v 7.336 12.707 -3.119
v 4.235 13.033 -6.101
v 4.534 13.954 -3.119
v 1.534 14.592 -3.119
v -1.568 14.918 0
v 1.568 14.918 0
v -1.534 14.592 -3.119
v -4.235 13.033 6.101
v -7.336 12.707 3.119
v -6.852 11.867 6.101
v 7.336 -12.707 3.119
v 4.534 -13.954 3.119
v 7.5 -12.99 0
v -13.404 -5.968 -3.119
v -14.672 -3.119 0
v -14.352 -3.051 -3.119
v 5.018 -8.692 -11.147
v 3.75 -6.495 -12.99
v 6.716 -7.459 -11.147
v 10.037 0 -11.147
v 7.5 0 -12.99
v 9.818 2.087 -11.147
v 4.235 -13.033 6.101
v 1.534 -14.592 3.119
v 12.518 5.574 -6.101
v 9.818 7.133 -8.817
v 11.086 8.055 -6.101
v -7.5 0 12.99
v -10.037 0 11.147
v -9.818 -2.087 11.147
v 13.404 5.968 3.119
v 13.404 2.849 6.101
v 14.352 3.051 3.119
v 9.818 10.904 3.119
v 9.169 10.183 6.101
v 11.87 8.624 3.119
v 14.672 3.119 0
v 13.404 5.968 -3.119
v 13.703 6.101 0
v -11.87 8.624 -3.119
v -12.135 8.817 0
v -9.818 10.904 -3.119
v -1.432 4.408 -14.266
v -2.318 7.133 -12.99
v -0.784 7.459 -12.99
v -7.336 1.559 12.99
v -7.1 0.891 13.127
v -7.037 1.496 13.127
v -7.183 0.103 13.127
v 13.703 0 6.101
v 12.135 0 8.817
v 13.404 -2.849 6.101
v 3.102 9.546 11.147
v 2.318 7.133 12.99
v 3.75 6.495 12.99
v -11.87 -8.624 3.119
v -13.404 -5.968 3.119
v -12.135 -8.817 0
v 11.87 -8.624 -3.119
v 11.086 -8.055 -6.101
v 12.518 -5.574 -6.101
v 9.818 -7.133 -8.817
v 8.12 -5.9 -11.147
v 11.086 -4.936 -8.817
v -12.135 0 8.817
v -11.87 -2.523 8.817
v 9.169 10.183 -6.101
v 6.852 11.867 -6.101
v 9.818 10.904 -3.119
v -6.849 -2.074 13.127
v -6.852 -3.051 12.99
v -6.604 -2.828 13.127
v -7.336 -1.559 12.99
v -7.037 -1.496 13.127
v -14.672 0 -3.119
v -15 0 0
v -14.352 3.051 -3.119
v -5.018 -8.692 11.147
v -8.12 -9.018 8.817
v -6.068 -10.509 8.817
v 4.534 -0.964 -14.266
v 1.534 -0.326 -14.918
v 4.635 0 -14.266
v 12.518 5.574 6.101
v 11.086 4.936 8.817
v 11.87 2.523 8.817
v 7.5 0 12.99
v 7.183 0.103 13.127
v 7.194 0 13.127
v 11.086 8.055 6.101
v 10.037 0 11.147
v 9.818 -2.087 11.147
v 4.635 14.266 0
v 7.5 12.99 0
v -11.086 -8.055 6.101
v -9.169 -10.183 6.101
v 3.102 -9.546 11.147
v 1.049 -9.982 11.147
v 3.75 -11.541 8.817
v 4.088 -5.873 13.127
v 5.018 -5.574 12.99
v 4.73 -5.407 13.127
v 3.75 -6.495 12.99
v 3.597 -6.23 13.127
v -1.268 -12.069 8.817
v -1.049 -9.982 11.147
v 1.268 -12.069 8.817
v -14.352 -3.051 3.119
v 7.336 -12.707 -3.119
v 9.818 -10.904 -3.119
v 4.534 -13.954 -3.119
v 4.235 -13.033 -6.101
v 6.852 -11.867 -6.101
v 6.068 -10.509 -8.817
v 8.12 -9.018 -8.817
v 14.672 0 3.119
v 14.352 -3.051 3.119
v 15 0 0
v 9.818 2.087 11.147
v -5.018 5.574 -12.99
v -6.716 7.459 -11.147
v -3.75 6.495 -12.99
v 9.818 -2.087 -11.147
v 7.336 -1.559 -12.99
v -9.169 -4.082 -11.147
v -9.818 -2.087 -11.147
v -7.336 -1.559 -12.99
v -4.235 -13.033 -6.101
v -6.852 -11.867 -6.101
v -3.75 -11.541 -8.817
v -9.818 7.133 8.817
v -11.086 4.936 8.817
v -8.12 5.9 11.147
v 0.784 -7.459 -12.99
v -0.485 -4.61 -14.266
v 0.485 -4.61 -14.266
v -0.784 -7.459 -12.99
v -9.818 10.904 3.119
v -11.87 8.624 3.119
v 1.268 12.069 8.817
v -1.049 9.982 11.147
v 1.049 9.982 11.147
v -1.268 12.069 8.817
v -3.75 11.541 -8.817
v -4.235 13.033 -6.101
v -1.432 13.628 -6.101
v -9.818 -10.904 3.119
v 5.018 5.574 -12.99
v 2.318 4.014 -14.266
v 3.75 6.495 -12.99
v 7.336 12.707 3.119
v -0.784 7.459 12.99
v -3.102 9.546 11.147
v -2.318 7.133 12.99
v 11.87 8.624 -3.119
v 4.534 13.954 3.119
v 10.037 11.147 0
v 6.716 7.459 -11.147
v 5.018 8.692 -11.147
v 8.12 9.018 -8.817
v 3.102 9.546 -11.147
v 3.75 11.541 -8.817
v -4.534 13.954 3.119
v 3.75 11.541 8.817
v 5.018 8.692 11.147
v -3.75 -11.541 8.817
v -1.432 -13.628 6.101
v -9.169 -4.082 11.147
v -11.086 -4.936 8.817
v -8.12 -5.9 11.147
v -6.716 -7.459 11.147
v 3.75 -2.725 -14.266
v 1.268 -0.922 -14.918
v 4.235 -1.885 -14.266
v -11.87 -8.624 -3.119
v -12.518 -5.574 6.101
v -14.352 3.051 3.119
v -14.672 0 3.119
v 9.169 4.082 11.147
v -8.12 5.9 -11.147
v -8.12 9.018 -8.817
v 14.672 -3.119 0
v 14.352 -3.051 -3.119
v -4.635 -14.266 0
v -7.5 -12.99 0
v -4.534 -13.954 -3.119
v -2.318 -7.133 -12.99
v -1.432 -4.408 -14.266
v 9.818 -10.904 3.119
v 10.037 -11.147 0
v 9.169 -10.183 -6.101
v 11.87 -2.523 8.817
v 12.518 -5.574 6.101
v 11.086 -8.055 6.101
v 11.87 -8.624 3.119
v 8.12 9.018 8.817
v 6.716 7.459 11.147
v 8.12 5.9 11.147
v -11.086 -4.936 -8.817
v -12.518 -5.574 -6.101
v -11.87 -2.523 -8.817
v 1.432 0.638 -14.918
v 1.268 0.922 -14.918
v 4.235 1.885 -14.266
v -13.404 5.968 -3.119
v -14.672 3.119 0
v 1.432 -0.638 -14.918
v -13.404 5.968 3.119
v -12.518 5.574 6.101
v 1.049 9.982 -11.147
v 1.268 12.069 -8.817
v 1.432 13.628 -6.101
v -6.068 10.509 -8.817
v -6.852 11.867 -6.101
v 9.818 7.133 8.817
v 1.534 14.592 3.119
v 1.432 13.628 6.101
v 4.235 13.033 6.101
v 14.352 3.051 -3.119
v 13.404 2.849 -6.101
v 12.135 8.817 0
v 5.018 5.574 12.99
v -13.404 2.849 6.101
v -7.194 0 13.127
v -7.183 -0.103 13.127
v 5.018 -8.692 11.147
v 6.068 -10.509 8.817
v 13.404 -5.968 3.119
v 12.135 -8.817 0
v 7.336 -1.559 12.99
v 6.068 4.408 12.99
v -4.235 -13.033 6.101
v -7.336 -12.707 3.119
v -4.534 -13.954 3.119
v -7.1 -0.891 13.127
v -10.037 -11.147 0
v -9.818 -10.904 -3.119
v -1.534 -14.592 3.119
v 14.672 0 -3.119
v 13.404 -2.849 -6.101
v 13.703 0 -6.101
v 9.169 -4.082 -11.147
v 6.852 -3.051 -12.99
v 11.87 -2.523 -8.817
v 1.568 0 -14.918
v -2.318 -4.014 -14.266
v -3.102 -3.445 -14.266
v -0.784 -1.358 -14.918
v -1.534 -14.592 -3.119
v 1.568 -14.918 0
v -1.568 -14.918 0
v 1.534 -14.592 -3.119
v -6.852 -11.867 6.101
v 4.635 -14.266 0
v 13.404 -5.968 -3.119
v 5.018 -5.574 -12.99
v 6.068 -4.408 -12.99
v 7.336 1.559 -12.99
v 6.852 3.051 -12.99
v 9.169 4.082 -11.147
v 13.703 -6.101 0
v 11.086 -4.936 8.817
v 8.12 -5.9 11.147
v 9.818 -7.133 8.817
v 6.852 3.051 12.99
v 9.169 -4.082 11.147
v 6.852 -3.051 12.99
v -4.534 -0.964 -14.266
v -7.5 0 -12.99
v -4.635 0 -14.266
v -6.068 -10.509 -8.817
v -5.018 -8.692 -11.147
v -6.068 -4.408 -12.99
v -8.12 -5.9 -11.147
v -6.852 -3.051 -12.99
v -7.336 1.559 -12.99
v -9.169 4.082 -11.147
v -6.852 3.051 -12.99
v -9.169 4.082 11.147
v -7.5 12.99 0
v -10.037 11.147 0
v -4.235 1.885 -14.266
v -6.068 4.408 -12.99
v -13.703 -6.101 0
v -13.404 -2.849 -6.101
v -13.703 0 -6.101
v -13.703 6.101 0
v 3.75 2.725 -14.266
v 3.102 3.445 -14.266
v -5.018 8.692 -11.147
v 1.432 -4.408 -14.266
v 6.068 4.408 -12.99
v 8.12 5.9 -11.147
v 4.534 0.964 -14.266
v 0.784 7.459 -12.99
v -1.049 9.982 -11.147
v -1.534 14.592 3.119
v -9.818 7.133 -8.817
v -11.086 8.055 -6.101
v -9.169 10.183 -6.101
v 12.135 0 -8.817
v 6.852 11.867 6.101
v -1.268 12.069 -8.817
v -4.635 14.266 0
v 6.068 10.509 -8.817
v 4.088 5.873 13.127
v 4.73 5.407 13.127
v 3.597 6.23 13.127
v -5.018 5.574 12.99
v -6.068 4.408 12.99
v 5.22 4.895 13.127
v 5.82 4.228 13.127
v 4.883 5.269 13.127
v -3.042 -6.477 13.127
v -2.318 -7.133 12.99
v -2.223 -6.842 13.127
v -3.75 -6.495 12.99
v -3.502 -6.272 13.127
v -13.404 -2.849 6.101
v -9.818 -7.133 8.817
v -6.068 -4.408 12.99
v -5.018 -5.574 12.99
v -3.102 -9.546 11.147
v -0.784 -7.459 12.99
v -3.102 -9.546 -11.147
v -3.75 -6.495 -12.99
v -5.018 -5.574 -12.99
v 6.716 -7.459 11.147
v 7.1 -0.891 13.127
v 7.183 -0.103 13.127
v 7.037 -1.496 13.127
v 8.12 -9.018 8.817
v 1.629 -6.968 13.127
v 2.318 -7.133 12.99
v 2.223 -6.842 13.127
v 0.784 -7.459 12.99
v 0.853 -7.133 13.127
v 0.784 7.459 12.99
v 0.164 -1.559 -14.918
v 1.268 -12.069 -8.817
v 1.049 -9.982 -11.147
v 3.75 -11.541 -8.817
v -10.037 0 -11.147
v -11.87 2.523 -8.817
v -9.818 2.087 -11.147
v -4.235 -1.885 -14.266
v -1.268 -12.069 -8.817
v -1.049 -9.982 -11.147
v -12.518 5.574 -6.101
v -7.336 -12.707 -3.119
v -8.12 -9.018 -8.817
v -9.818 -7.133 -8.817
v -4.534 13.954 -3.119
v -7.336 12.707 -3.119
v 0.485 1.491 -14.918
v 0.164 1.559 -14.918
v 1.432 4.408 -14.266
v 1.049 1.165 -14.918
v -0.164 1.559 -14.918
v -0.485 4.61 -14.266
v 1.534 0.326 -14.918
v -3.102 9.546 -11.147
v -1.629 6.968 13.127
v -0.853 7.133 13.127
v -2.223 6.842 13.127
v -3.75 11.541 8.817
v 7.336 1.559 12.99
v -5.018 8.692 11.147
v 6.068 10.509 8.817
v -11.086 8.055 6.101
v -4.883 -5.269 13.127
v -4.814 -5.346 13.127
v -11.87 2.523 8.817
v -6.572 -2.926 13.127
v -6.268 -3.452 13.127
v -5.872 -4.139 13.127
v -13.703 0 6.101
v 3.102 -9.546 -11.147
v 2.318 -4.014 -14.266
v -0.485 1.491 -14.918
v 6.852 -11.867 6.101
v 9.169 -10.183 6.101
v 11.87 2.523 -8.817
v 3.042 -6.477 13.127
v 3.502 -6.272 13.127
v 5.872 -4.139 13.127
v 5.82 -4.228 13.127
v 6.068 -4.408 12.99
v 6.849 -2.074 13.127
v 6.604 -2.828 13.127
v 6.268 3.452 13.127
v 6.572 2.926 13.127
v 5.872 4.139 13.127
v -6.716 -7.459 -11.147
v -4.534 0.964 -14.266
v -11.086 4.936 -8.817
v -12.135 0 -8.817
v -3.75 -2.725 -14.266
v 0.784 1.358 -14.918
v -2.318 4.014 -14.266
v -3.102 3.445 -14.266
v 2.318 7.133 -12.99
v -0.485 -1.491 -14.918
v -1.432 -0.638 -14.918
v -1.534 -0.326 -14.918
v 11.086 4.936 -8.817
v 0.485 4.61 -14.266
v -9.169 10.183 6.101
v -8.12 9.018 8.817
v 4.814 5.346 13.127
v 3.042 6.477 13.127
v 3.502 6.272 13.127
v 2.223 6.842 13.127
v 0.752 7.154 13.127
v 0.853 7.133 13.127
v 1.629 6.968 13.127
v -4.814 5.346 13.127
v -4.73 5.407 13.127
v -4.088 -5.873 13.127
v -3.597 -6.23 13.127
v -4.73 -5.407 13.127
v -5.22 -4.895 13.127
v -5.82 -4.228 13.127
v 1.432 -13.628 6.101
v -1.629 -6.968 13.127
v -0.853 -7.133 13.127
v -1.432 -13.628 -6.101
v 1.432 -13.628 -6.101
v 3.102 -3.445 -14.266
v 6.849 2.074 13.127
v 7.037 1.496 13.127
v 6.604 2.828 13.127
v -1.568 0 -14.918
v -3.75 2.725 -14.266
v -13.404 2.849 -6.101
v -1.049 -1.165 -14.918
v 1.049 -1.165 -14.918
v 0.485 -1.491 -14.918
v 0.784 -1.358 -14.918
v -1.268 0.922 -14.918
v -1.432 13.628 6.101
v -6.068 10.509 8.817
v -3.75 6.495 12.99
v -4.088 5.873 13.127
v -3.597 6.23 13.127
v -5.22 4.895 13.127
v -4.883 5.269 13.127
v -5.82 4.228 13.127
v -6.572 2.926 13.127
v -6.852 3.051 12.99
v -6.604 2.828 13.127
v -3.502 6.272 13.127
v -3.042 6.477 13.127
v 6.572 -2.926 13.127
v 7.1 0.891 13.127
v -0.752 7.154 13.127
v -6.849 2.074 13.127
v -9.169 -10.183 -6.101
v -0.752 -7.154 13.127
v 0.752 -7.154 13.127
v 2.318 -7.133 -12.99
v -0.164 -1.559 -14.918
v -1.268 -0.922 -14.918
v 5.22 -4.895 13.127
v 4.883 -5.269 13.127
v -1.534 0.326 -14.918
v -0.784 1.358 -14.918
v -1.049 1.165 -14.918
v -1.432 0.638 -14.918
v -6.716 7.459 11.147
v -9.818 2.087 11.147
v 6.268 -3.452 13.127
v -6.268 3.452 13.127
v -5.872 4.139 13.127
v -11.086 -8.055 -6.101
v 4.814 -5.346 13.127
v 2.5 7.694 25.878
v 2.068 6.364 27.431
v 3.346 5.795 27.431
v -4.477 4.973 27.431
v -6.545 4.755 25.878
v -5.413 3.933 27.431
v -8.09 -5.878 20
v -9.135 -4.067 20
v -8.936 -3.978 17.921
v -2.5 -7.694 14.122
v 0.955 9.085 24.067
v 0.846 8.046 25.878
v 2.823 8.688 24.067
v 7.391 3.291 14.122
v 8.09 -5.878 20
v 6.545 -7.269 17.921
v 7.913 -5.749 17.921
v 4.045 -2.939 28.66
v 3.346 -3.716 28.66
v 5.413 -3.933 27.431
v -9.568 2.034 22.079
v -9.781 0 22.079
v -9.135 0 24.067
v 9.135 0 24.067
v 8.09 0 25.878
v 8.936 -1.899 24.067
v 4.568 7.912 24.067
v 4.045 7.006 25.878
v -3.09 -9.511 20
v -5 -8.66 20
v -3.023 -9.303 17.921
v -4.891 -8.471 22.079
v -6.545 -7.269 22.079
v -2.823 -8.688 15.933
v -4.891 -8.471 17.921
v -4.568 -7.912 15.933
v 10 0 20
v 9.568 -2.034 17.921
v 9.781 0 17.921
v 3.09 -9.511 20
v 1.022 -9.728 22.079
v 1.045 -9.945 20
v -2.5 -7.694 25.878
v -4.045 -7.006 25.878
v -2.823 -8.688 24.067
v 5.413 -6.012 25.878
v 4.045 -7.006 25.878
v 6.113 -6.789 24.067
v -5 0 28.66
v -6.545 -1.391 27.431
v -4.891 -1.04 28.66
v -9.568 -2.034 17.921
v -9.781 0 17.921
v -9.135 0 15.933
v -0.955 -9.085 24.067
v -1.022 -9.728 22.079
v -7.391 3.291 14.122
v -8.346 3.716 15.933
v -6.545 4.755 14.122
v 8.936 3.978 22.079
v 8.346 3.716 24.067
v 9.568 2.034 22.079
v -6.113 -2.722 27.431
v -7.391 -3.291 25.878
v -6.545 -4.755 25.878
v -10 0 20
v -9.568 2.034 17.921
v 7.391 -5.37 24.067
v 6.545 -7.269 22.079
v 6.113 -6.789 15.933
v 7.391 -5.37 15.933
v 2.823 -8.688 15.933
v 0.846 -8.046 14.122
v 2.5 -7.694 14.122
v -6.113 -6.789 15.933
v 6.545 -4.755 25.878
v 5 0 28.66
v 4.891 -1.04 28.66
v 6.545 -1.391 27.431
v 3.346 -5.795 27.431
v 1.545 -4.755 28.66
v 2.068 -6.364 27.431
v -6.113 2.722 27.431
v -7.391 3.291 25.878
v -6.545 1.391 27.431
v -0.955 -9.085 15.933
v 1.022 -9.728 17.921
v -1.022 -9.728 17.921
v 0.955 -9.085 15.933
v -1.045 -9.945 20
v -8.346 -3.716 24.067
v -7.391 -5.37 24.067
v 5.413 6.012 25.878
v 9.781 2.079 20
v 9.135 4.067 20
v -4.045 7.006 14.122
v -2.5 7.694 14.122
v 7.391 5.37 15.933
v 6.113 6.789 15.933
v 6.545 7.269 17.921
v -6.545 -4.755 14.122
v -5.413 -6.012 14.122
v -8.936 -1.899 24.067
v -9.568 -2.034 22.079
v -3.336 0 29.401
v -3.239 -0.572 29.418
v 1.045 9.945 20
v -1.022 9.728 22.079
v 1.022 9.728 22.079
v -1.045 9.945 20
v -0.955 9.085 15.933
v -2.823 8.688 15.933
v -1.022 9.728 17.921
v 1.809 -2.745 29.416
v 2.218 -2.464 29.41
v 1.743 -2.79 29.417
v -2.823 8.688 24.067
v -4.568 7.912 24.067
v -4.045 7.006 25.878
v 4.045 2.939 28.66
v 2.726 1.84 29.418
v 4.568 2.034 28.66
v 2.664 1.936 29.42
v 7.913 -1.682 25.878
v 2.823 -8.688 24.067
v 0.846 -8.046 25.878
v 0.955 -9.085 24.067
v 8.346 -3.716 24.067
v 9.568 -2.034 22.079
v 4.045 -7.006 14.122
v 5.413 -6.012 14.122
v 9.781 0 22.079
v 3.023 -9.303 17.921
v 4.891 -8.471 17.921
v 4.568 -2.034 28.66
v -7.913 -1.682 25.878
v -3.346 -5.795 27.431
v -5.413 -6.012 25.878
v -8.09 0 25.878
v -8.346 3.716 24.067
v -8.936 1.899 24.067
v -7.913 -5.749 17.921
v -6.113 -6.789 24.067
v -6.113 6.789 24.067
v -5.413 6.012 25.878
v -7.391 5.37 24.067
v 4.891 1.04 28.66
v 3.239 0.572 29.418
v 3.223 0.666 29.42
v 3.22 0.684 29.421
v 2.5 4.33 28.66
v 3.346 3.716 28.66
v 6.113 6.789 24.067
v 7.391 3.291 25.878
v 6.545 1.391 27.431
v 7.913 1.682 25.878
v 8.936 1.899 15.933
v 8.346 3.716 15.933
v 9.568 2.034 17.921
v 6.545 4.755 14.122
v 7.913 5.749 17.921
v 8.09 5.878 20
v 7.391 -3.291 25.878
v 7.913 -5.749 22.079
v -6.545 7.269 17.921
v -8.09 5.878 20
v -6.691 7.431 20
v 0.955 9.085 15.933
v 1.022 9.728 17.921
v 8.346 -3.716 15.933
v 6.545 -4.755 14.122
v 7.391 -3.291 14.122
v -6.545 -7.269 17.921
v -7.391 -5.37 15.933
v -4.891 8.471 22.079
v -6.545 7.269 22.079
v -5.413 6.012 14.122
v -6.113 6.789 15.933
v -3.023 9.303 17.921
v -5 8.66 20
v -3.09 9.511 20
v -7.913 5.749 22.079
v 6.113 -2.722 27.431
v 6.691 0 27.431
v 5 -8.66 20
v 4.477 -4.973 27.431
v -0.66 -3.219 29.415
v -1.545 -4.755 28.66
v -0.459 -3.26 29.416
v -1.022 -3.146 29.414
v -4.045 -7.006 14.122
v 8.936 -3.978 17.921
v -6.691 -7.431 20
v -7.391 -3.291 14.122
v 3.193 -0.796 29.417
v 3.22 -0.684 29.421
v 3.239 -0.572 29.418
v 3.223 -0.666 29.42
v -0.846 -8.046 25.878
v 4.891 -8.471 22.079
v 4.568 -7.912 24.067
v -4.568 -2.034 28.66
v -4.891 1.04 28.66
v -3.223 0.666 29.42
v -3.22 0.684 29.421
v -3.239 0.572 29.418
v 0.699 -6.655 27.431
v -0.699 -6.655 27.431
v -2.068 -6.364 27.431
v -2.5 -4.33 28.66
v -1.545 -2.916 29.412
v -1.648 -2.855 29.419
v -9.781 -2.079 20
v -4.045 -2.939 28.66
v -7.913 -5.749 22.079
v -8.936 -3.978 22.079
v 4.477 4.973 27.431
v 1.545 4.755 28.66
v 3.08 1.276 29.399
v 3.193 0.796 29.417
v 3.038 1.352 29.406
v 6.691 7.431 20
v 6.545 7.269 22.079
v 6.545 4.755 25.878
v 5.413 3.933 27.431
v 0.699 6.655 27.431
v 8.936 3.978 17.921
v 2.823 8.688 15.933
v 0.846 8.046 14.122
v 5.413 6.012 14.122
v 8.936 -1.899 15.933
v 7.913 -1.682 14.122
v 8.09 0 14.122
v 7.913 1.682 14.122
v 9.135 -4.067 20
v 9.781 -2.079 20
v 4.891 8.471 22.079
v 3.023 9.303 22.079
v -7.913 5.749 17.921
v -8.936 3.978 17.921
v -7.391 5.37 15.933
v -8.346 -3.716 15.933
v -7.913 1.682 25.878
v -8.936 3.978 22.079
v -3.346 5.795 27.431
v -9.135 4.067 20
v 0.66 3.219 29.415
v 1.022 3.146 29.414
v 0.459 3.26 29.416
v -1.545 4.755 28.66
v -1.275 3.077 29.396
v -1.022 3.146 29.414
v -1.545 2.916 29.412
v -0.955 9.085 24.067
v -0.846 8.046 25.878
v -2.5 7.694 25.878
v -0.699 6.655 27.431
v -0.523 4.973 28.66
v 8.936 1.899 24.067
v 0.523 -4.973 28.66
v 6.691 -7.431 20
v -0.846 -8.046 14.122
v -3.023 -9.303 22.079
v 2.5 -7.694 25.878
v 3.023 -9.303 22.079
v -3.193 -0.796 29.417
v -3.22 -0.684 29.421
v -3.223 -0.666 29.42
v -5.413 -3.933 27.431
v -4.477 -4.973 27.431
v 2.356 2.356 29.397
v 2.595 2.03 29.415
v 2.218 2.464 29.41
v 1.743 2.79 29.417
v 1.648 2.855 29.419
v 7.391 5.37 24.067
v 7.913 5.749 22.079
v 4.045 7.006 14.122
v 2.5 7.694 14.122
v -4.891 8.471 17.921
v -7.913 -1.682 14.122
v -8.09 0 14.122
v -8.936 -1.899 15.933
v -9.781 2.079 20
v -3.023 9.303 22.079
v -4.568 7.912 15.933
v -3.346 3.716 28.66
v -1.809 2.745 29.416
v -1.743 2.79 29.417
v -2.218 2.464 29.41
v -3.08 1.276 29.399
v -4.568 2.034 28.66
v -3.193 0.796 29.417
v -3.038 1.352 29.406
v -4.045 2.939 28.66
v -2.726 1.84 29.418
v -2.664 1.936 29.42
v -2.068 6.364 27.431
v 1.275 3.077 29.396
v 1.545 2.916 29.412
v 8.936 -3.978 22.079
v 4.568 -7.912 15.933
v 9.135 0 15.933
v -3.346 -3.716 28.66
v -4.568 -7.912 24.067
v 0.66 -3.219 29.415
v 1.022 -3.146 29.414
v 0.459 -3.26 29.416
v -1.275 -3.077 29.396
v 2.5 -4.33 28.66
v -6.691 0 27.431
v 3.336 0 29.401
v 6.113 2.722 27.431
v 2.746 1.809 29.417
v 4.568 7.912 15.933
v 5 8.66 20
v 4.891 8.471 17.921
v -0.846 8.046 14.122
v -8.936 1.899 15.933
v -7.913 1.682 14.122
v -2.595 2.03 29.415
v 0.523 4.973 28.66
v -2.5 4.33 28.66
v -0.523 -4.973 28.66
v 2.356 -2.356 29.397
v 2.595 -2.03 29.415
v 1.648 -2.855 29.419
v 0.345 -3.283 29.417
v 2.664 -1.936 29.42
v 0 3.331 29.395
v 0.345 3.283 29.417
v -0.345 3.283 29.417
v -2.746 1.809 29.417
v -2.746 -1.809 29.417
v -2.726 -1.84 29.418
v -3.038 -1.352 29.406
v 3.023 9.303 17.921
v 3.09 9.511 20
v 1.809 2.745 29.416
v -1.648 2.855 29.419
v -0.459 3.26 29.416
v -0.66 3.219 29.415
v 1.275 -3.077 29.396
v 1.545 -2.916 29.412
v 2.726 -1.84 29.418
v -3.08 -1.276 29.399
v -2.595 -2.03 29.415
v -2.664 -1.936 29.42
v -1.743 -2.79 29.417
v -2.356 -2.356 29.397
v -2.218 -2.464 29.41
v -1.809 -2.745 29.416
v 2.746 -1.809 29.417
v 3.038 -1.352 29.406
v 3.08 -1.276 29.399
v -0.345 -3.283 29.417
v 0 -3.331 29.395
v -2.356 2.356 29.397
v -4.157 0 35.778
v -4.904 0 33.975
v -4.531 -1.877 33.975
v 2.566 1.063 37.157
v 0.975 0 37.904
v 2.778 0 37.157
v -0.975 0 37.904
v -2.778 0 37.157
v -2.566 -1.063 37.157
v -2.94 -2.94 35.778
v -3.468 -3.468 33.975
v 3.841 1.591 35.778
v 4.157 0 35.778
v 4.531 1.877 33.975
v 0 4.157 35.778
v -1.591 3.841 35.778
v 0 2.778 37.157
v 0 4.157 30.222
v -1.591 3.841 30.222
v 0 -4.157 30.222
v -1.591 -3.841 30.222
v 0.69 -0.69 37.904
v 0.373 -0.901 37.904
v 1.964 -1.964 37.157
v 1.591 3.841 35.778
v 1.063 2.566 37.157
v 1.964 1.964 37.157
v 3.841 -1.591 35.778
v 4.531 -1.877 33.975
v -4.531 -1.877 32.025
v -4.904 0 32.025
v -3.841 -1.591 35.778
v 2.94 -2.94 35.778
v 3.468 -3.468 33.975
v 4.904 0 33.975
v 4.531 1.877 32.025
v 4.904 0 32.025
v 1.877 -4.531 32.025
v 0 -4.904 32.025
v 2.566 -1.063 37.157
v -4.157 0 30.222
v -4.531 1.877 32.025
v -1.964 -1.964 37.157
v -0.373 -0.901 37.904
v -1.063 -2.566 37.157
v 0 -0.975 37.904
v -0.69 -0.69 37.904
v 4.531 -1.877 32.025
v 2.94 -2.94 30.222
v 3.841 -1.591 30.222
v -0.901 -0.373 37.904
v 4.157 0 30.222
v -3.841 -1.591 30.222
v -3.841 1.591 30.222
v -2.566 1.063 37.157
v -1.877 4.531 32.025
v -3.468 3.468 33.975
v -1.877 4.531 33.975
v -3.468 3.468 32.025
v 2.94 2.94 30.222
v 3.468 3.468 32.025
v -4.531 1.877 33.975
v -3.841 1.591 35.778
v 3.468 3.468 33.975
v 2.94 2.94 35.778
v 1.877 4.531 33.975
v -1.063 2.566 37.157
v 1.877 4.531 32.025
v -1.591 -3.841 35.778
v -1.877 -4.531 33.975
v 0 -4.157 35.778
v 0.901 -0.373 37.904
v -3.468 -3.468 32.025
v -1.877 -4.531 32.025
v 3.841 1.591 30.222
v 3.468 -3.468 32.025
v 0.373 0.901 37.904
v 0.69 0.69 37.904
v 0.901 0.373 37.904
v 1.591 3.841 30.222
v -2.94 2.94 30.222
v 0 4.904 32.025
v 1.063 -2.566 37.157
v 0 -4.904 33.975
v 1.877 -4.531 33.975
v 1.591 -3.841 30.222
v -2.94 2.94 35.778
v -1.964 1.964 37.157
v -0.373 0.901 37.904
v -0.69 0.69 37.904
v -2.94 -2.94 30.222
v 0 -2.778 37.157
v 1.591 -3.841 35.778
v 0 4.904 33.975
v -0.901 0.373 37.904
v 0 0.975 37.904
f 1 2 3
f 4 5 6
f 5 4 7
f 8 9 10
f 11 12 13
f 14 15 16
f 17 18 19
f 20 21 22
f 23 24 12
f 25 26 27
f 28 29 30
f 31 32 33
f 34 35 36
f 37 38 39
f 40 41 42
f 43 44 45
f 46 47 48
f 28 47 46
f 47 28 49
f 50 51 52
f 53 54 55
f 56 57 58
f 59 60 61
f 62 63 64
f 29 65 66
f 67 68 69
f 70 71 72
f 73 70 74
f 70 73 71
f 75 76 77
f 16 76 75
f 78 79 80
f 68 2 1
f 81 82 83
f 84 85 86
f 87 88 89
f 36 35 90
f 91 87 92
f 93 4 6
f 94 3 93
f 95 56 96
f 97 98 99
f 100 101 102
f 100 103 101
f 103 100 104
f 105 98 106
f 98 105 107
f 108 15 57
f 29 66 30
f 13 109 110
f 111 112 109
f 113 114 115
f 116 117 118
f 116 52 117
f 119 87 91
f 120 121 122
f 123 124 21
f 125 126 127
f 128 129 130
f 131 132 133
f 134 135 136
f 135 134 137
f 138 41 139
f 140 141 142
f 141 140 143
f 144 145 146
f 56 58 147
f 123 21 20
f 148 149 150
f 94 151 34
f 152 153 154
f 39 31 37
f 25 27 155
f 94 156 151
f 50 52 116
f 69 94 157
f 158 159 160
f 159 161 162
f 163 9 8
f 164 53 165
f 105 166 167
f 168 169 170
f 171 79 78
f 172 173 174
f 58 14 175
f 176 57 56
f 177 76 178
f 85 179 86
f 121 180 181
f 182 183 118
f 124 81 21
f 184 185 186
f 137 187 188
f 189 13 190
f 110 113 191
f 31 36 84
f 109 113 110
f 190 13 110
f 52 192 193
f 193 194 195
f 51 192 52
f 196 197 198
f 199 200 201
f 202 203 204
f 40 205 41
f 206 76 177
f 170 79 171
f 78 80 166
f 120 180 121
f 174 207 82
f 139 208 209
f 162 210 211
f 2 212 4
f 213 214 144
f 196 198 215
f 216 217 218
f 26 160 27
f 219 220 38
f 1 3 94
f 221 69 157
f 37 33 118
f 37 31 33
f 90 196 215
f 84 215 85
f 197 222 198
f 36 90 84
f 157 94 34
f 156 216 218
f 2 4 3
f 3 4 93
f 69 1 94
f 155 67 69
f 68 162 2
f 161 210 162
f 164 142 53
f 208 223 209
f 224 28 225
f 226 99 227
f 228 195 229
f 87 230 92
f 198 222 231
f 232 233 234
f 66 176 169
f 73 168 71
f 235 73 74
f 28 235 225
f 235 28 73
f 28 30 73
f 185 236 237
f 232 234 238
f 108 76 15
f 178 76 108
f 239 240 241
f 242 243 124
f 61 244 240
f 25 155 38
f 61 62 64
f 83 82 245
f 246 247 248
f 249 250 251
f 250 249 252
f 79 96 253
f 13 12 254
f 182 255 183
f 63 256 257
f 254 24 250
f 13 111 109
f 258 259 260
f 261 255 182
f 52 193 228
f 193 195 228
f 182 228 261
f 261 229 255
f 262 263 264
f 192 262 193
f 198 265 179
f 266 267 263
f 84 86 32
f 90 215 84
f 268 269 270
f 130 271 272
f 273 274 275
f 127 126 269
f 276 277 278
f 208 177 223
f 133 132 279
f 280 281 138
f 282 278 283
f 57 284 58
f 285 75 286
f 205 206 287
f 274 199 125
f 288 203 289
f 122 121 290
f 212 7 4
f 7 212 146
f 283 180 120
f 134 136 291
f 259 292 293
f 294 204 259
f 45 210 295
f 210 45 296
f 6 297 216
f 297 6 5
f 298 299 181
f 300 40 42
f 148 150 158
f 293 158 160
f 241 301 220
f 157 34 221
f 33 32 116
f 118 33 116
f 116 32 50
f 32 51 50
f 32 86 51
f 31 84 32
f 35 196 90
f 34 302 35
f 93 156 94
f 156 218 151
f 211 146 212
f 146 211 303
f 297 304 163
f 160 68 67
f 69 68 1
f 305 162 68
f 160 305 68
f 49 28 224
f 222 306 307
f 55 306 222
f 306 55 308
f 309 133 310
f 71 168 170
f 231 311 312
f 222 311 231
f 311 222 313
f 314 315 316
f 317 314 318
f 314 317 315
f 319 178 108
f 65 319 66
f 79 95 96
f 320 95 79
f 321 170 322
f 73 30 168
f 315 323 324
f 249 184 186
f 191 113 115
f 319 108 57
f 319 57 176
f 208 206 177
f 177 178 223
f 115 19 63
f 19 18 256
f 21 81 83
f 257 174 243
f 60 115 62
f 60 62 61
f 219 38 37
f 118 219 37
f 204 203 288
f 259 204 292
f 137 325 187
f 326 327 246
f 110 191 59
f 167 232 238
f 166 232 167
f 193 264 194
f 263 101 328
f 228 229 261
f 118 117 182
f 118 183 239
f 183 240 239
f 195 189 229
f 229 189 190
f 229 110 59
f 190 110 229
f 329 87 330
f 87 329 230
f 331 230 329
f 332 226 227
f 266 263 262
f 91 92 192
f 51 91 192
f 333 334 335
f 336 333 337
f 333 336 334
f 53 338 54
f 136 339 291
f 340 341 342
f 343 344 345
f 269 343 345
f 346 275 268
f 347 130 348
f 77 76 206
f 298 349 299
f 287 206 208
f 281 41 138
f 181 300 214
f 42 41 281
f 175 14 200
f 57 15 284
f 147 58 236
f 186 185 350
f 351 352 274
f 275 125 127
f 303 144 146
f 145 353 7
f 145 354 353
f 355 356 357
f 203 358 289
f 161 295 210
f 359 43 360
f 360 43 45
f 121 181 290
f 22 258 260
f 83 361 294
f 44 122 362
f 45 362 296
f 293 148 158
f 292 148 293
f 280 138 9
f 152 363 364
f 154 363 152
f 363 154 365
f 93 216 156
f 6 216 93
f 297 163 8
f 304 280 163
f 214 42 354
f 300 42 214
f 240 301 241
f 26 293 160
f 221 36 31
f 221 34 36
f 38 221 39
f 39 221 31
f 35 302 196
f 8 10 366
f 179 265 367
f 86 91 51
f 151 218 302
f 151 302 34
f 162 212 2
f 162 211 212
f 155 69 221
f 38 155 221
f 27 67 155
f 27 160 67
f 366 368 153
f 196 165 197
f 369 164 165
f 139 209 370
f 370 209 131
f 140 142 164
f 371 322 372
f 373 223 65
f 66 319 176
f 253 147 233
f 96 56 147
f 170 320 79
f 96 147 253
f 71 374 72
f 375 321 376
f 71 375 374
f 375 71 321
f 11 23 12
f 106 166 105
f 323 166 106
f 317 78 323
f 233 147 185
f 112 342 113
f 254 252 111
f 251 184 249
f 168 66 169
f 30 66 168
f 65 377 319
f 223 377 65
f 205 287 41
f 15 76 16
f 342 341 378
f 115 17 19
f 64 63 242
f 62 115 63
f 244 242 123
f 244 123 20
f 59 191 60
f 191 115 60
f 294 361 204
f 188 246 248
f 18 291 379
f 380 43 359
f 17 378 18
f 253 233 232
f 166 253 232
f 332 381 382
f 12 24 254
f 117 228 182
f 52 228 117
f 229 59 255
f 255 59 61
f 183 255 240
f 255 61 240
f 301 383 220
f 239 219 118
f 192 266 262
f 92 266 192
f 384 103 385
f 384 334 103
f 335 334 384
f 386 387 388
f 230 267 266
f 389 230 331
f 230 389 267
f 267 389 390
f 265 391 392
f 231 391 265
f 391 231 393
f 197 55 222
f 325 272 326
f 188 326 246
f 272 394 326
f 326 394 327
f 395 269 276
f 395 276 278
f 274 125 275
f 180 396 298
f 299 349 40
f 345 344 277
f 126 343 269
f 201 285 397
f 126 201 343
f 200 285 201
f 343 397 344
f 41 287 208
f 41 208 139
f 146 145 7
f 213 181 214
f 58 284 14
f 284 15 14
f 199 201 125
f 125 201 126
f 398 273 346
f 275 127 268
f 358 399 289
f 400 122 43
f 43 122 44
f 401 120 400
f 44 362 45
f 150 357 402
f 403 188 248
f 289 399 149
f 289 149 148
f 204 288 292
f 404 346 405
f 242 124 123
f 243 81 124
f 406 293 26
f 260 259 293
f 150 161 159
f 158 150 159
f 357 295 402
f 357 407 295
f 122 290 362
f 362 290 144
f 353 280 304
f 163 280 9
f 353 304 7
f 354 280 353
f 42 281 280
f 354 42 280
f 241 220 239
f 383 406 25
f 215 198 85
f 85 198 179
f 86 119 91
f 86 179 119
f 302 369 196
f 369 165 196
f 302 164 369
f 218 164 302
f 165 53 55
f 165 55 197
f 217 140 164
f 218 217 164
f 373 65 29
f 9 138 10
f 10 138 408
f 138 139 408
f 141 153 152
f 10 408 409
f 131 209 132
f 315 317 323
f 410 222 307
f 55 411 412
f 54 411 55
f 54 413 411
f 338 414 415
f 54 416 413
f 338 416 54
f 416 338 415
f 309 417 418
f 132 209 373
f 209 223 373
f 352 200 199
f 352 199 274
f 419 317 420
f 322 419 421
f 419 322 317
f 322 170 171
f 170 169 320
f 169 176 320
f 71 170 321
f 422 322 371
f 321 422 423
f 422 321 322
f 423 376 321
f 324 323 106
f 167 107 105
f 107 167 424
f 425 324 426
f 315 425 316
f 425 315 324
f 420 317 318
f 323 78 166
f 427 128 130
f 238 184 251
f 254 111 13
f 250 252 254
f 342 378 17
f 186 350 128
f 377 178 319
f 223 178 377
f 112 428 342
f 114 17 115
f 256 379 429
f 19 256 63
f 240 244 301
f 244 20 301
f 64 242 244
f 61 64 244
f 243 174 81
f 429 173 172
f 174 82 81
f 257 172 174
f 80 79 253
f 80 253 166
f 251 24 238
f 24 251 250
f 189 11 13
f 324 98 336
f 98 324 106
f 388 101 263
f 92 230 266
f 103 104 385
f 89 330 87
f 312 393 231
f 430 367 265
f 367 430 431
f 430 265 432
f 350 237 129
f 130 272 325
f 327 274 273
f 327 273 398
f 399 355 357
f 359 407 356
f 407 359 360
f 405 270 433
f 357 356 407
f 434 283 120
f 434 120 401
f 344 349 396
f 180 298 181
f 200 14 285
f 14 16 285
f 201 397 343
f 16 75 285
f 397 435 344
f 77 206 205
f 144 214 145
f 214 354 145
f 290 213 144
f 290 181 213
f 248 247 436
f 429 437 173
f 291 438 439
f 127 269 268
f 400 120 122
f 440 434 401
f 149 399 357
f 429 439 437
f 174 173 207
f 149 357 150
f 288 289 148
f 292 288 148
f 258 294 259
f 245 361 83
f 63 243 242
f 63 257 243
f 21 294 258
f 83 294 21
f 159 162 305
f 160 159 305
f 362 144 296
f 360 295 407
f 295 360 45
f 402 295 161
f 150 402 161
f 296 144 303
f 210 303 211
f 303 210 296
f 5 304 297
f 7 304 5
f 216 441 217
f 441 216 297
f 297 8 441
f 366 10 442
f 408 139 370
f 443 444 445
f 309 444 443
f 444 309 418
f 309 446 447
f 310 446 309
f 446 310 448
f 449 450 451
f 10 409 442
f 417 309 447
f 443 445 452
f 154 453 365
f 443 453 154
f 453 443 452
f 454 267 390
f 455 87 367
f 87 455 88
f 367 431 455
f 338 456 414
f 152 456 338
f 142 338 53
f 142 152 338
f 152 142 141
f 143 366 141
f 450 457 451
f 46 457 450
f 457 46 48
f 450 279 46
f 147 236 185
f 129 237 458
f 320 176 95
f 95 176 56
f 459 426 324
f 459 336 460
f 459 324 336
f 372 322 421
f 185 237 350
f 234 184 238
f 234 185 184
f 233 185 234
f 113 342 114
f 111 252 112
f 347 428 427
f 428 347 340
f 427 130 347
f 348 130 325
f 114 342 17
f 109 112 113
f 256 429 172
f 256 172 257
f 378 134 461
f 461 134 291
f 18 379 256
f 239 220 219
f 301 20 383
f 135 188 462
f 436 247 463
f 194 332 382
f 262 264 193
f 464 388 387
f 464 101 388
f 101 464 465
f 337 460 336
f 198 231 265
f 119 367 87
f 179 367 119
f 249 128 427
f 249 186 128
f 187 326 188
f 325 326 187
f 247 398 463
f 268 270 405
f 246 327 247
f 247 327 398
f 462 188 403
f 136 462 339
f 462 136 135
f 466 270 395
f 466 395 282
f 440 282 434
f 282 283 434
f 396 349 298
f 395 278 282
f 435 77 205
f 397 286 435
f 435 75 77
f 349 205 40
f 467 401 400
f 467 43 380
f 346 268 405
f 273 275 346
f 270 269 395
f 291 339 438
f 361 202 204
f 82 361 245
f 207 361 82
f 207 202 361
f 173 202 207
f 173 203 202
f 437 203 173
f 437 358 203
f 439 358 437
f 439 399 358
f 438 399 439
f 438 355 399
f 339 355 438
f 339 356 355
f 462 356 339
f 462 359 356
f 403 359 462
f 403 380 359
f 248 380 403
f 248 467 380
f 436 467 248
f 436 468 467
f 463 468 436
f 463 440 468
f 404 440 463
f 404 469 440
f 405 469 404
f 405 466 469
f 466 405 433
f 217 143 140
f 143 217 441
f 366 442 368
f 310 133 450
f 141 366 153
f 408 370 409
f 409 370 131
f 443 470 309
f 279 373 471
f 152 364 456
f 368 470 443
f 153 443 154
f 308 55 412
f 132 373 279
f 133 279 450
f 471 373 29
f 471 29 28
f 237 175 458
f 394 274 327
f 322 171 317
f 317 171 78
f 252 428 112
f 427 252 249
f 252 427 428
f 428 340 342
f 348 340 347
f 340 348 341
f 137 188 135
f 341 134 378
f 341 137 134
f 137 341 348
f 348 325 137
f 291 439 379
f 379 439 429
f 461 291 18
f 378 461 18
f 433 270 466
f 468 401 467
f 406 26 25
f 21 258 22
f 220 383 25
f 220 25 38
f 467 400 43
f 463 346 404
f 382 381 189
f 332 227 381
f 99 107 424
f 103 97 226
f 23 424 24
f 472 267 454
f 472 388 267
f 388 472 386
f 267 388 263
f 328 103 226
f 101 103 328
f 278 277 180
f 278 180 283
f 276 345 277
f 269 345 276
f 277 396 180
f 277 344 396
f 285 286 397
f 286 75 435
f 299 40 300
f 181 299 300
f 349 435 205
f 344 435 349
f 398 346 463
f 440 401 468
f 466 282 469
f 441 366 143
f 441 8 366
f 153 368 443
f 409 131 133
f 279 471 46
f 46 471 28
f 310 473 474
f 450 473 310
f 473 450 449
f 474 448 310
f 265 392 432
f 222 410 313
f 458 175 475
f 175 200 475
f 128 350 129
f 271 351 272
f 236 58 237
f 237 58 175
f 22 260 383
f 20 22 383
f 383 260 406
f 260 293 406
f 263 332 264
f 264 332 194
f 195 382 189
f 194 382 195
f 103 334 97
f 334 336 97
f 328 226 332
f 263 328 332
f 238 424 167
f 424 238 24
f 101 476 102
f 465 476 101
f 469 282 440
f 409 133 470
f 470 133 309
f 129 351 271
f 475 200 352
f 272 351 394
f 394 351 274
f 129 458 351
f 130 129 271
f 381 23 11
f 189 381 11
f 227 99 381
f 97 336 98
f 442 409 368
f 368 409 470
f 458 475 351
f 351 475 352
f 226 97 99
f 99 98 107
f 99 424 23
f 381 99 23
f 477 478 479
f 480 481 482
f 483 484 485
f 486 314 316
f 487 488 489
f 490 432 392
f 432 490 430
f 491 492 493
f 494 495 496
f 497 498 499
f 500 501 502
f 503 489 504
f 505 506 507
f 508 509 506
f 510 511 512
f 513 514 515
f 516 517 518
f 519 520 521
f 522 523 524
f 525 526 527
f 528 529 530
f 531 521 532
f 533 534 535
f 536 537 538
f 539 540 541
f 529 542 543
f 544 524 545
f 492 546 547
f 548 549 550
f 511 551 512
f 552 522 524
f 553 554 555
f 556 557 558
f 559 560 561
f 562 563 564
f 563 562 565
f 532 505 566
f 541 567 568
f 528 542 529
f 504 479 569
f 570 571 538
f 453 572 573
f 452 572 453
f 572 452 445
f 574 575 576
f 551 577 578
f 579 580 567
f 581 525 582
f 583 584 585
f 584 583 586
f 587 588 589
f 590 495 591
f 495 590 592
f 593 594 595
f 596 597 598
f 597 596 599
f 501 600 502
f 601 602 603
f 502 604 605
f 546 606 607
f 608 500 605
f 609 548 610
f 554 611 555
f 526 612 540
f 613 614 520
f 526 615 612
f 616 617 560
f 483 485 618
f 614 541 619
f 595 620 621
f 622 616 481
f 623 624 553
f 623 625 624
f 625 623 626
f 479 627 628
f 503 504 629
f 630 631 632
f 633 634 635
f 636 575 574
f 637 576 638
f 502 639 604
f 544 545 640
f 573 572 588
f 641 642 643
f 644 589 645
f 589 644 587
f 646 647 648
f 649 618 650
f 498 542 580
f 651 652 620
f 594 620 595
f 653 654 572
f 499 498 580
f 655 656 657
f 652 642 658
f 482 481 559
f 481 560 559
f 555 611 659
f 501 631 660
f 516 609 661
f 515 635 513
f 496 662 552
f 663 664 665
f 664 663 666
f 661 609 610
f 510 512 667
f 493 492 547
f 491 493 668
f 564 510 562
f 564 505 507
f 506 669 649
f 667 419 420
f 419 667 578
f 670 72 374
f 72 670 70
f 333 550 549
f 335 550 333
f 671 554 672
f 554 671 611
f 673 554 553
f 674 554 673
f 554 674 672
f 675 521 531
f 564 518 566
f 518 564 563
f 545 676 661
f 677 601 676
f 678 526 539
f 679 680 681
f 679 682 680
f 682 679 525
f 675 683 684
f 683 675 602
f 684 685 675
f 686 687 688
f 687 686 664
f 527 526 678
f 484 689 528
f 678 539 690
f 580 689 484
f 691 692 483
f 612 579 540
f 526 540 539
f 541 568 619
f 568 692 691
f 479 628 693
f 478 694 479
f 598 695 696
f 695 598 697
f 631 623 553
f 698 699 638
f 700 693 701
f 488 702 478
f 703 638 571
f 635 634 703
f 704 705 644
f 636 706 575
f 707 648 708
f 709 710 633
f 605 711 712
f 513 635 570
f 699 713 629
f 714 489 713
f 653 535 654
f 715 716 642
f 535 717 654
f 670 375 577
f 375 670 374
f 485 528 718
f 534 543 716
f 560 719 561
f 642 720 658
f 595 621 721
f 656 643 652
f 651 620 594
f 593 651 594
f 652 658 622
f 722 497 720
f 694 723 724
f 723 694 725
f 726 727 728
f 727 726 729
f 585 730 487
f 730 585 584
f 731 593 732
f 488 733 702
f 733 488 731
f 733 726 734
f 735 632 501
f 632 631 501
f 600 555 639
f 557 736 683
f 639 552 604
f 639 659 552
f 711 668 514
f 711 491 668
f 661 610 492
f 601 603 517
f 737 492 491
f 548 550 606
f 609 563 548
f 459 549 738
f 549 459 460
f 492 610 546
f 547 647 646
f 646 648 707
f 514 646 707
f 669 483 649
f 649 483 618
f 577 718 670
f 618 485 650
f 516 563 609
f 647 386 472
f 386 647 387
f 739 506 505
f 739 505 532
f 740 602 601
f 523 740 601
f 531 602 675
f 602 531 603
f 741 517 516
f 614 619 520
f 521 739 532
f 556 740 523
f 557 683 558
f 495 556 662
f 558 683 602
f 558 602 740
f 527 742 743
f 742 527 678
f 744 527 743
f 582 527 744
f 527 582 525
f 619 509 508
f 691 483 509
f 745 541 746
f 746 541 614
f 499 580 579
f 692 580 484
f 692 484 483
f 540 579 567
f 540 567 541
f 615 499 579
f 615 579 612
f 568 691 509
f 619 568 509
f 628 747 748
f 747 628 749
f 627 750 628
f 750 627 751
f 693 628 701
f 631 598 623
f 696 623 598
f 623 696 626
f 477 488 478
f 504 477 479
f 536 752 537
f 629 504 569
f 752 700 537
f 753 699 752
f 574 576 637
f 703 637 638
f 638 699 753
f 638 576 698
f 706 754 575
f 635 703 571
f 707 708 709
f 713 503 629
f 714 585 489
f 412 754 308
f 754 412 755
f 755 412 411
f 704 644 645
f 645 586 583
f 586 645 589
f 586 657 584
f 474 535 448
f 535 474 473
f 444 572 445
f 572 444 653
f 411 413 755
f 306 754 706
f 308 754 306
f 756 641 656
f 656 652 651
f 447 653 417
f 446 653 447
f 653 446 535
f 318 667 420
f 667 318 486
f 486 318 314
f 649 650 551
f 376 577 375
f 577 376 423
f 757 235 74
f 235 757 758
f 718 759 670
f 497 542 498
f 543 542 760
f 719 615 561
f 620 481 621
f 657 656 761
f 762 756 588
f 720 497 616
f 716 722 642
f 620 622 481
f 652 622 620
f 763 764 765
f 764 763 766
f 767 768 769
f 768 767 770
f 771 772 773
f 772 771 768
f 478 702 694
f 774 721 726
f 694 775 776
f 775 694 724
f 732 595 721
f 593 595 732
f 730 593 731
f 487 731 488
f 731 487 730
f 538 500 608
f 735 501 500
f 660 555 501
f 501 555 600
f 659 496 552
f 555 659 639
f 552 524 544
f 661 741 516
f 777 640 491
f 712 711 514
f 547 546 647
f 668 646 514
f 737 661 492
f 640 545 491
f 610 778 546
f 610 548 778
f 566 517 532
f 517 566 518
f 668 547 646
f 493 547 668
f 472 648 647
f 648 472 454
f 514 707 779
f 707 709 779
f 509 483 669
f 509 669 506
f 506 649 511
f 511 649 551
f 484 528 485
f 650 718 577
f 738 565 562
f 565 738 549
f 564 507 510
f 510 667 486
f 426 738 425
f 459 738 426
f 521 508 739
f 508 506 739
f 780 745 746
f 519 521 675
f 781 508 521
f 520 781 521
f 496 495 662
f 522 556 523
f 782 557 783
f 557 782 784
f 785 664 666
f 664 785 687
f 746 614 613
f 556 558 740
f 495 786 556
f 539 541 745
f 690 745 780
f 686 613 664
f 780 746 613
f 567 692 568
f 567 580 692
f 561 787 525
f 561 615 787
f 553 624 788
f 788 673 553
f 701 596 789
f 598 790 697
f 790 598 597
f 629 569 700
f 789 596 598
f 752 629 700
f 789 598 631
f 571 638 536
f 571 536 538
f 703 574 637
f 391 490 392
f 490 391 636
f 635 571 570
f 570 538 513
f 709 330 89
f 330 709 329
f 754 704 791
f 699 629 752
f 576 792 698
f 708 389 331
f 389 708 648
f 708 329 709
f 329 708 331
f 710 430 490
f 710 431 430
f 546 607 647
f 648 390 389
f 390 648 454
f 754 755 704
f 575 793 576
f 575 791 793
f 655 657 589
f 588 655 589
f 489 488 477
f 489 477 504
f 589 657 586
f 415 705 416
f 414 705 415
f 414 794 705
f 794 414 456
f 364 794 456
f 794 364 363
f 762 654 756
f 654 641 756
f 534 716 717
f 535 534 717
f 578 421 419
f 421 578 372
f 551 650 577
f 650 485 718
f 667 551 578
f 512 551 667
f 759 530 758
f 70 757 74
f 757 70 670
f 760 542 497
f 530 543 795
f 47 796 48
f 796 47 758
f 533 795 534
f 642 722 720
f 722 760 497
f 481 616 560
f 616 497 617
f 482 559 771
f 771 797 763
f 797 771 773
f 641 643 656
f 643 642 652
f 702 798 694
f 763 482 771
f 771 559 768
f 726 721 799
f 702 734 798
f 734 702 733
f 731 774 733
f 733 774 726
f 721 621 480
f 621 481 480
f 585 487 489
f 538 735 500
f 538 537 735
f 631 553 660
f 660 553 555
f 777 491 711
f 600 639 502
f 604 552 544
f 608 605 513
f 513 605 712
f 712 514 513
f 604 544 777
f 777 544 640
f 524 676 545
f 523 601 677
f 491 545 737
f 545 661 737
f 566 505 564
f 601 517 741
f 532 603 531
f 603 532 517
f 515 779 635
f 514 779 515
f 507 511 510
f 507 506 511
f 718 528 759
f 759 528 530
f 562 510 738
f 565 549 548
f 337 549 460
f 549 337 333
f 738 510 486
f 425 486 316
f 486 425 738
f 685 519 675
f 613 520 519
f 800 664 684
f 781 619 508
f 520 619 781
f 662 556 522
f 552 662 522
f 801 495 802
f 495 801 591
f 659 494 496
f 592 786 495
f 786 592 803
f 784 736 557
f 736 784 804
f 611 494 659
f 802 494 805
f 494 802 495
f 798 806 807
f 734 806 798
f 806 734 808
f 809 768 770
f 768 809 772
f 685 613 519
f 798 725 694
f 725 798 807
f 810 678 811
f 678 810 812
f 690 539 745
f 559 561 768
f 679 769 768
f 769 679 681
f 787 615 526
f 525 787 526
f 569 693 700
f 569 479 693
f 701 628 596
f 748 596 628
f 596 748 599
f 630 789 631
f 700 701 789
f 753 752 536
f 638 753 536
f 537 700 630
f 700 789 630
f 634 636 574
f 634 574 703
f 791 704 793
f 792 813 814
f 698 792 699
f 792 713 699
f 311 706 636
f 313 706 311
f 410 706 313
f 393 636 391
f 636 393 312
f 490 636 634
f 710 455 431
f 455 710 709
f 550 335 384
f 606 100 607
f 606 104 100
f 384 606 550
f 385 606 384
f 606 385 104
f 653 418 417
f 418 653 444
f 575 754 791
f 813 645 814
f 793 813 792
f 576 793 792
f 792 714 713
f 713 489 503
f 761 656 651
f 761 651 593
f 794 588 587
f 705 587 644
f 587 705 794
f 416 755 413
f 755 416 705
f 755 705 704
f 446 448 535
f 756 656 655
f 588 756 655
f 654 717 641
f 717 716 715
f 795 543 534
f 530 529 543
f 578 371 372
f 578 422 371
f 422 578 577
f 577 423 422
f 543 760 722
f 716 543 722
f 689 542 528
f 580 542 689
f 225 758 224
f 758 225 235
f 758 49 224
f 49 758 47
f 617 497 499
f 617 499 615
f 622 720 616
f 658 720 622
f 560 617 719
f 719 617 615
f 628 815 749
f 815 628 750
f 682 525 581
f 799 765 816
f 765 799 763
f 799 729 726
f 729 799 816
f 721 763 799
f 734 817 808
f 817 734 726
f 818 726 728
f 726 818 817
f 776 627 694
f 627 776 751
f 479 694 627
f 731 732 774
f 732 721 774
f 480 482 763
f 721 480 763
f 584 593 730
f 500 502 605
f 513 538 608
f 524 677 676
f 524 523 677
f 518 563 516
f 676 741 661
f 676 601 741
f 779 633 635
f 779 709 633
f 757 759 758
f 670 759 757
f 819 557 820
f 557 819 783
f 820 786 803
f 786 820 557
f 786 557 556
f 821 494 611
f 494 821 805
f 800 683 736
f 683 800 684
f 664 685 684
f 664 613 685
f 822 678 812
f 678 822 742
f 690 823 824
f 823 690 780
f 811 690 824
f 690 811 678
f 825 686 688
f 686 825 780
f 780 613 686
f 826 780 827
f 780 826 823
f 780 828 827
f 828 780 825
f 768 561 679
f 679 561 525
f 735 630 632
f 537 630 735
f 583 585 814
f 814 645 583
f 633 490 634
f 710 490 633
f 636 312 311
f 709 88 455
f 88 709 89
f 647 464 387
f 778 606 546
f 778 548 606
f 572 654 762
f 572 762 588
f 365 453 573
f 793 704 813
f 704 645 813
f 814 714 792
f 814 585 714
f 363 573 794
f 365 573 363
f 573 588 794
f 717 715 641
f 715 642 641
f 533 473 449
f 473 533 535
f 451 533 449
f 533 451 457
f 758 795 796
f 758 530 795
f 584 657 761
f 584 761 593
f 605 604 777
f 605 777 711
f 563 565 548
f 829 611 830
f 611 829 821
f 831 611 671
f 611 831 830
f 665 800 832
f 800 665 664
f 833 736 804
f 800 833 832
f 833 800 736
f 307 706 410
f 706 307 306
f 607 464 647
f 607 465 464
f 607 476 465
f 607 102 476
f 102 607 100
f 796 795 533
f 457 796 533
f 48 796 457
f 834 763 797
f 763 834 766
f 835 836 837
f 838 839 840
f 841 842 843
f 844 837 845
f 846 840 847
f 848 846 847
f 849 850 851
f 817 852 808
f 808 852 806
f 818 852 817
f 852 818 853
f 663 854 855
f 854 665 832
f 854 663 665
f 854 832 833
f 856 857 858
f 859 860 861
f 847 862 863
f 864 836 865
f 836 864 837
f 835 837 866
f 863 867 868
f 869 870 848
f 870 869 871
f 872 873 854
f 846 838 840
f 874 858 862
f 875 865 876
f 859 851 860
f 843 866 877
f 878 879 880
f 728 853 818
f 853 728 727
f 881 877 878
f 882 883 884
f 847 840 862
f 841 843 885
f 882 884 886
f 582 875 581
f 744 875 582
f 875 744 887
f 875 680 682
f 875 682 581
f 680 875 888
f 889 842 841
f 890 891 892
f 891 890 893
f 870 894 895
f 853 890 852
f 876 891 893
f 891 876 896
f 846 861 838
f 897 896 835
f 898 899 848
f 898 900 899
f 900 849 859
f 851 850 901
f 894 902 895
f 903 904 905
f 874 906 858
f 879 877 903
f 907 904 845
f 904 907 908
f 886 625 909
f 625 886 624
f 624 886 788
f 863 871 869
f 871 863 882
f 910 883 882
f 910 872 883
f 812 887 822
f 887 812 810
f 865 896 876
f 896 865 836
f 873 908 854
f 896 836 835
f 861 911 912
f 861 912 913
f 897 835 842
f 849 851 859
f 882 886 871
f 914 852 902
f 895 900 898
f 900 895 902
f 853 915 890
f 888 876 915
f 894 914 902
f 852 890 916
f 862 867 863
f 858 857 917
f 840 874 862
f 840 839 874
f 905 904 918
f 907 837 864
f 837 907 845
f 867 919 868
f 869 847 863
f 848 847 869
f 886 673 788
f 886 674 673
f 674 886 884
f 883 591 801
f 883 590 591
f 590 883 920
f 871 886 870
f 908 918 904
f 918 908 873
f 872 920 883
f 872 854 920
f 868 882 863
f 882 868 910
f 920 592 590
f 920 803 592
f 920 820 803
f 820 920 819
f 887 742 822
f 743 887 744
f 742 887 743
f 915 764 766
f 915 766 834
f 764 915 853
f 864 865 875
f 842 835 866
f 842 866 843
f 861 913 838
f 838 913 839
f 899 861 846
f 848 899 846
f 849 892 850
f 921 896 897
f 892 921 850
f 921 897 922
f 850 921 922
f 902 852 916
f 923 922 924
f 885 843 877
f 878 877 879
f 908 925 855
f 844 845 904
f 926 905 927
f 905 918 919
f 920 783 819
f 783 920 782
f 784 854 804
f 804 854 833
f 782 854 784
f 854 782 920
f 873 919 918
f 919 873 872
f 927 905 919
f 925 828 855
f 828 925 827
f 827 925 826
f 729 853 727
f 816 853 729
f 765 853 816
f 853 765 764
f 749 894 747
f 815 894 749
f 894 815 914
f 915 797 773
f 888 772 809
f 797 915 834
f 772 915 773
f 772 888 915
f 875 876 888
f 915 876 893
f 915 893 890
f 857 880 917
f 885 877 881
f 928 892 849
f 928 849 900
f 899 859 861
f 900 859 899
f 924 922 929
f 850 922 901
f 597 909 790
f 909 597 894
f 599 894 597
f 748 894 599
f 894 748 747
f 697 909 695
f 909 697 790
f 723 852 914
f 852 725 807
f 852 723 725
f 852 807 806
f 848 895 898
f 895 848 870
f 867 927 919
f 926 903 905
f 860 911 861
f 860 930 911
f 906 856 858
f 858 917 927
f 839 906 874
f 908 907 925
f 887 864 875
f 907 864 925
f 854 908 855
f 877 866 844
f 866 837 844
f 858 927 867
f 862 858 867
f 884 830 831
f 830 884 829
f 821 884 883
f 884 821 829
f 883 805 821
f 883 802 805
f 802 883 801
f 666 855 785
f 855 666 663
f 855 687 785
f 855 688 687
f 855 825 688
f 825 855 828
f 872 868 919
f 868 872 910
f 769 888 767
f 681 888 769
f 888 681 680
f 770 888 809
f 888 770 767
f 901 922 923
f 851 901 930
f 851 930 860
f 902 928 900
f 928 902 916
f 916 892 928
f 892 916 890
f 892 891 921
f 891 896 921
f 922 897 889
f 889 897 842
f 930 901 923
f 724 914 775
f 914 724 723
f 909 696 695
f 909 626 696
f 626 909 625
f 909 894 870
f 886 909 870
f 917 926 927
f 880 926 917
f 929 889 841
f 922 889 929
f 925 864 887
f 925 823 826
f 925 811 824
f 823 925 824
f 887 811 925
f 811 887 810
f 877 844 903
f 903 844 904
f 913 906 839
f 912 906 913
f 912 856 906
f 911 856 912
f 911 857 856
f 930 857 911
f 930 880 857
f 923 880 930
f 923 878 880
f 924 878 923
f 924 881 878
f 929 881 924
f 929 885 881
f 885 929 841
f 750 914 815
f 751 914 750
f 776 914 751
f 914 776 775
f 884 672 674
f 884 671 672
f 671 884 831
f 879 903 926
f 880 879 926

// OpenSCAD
sphere (15);
translate ([0,0,20])
sphere (10);
translate ([0,0,33])
sphere (5);
